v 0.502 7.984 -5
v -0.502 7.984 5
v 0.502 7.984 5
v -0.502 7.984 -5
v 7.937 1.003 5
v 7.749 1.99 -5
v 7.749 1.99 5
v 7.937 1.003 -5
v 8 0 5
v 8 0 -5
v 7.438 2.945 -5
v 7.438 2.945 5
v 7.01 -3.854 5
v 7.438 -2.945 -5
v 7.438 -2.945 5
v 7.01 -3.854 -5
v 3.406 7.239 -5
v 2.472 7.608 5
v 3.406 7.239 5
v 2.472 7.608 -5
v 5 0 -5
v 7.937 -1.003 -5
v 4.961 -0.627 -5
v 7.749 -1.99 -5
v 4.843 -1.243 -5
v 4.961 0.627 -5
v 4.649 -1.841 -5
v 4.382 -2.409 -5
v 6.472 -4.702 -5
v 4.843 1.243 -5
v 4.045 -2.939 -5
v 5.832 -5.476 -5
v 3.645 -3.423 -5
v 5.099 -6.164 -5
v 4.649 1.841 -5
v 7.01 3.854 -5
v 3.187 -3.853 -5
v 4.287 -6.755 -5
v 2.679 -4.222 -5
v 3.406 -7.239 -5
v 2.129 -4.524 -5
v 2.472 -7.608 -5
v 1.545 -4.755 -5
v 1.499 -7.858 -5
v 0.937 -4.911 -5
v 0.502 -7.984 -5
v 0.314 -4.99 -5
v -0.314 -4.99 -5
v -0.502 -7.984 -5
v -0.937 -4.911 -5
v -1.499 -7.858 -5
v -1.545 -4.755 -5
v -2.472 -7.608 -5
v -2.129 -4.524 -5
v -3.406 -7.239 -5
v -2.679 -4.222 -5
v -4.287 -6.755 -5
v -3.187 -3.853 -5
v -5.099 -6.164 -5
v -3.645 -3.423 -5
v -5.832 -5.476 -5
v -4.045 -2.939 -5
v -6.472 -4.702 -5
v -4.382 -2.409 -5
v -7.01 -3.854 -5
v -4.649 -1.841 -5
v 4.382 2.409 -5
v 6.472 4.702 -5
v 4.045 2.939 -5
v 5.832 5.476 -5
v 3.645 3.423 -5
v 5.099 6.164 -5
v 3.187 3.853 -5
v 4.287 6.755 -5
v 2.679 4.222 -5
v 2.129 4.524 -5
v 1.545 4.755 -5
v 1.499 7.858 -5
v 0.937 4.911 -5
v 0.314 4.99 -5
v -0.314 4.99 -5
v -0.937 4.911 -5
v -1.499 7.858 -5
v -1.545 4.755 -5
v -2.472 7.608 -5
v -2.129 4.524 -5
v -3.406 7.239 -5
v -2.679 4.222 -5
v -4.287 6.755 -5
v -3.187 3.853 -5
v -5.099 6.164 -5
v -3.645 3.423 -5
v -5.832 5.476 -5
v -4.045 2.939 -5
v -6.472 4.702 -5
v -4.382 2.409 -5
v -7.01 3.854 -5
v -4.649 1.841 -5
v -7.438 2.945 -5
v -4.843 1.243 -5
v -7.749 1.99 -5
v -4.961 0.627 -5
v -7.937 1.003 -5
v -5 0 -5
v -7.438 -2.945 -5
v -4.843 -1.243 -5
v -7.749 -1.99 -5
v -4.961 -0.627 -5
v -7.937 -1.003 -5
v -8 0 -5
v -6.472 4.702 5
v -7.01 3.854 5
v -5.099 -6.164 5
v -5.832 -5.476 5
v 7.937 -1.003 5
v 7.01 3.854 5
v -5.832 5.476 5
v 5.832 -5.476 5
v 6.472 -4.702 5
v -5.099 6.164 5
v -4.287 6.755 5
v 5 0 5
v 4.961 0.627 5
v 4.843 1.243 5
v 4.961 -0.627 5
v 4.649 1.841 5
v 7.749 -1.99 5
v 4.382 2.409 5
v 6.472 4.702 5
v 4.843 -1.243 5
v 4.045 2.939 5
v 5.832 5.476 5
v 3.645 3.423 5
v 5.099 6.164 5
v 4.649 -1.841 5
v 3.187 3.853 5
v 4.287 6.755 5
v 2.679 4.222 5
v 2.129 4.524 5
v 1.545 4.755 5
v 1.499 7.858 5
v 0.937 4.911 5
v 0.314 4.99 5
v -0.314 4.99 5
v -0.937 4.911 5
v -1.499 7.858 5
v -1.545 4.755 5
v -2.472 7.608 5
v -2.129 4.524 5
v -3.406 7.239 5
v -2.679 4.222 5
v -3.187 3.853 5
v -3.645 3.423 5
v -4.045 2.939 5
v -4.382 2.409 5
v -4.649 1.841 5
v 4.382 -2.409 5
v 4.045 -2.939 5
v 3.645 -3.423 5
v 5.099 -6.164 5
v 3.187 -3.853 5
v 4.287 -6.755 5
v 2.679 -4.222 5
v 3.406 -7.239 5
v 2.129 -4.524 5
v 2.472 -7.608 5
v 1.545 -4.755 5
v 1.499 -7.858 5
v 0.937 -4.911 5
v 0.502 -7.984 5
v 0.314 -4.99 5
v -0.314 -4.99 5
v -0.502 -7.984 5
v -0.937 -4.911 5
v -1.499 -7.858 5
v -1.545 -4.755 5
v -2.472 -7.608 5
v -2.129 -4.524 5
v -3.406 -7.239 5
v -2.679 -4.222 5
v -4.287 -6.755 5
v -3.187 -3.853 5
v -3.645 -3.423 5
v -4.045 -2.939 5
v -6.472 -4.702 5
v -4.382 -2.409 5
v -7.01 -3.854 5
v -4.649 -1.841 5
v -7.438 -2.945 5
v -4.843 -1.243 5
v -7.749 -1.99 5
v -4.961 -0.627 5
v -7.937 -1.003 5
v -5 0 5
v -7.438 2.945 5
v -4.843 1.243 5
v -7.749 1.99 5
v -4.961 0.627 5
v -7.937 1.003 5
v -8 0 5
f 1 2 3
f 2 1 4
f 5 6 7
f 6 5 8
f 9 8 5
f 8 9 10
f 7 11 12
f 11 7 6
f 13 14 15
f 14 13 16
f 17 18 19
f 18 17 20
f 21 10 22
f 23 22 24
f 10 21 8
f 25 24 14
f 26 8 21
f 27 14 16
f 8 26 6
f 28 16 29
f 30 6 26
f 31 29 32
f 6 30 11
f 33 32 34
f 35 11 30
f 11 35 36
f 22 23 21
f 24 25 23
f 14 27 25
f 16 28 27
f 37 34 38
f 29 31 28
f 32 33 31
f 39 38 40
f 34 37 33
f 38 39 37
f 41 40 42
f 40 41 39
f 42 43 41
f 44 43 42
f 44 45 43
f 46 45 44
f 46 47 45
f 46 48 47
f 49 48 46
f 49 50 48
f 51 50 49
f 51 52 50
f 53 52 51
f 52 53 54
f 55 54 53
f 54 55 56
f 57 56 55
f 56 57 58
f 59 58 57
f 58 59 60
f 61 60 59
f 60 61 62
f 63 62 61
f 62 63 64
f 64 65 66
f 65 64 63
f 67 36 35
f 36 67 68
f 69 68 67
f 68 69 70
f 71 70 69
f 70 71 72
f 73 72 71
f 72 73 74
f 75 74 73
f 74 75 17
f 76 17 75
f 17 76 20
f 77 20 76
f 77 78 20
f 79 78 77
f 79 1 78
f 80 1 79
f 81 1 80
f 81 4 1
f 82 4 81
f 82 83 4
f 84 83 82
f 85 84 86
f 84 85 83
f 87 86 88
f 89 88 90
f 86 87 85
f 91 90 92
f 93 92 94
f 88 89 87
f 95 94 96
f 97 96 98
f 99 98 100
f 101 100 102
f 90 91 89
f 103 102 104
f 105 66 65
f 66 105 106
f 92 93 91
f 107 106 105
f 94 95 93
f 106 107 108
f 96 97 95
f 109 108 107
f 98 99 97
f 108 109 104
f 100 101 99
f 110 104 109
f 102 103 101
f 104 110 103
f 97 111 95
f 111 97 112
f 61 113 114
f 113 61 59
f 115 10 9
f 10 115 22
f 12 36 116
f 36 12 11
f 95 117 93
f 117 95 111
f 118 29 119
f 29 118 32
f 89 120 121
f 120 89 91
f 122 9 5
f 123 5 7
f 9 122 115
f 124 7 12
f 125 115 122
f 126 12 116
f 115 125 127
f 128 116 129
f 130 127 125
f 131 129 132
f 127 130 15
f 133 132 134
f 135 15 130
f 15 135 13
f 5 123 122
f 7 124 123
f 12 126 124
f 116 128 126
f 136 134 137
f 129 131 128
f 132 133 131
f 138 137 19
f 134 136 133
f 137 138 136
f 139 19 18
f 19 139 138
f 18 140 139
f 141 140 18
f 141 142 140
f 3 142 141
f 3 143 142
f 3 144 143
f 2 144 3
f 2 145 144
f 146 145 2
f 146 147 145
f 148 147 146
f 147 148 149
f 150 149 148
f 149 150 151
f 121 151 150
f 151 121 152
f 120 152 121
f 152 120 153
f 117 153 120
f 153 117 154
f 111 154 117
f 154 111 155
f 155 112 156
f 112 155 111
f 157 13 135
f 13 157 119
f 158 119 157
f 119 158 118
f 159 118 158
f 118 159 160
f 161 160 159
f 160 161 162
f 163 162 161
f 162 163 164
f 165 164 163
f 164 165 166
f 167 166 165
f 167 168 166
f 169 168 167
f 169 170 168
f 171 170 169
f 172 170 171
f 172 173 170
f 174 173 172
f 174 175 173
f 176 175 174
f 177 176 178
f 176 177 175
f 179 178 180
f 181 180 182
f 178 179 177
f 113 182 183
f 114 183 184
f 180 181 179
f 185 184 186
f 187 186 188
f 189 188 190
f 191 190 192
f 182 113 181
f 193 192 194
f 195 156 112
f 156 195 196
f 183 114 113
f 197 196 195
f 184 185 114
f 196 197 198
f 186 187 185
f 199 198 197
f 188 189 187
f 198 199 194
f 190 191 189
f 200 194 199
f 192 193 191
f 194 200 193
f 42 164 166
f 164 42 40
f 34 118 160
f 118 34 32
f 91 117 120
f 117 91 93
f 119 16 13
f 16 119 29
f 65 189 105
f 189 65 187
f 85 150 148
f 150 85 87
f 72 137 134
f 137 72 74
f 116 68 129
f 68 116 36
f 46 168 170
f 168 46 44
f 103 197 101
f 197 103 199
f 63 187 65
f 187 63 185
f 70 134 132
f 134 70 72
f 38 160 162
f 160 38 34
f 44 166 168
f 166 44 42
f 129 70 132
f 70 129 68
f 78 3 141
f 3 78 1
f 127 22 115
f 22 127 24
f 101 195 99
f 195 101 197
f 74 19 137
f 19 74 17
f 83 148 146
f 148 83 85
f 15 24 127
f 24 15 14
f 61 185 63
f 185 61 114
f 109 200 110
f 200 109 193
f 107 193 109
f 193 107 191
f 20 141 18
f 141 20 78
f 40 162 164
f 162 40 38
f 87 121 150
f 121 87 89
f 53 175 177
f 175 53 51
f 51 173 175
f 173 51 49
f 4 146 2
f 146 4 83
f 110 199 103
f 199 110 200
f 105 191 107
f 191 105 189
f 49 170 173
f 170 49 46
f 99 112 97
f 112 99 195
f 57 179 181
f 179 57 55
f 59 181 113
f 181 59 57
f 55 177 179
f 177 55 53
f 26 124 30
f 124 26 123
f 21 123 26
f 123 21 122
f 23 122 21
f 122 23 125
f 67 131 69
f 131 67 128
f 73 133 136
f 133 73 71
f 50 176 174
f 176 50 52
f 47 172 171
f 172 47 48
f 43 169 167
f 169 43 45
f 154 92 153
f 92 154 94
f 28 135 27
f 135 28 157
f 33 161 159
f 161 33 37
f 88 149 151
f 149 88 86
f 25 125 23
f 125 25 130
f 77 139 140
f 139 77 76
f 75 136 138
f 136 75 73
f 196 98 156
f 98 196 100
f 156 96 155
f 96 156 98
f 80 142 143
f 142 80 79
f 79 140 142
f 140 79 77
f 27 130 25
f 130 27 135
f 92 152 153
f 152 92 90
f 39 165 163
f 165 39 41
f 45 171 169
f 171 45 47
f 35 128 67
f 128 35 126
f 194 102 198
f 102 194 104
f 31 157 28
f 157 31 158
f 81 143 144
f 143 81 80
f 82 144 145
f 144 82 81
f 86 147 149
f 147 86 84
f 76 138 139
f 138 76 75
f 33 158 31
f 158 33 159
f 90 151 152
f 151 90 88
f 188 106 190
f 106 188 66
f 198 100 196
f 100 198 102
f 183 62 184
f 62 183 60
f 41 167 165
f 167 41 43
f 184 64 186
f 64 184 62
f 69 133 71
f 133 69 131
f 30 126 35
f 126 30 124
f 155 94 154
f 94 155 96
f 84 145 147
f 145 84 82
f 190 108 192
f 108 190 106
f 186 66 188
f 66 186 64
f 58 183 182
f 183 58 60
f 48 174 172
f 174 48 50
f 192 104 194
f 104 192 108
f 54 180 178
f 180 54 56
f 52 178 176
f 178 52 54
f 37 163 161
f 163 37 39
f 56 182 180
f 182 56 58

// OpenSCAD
$fn = 50;


difference() {
	union() {
		translate(v = [0, 0, -5.0000000000]) {
			cylinder(h = 10, r = 8.0000000000);
		}
	}
	union() {
		translate(v = [0, 0, -100.0000000000]) {
			cylinder(h = 200, r = 5.0000000000);
		}
	}
}
